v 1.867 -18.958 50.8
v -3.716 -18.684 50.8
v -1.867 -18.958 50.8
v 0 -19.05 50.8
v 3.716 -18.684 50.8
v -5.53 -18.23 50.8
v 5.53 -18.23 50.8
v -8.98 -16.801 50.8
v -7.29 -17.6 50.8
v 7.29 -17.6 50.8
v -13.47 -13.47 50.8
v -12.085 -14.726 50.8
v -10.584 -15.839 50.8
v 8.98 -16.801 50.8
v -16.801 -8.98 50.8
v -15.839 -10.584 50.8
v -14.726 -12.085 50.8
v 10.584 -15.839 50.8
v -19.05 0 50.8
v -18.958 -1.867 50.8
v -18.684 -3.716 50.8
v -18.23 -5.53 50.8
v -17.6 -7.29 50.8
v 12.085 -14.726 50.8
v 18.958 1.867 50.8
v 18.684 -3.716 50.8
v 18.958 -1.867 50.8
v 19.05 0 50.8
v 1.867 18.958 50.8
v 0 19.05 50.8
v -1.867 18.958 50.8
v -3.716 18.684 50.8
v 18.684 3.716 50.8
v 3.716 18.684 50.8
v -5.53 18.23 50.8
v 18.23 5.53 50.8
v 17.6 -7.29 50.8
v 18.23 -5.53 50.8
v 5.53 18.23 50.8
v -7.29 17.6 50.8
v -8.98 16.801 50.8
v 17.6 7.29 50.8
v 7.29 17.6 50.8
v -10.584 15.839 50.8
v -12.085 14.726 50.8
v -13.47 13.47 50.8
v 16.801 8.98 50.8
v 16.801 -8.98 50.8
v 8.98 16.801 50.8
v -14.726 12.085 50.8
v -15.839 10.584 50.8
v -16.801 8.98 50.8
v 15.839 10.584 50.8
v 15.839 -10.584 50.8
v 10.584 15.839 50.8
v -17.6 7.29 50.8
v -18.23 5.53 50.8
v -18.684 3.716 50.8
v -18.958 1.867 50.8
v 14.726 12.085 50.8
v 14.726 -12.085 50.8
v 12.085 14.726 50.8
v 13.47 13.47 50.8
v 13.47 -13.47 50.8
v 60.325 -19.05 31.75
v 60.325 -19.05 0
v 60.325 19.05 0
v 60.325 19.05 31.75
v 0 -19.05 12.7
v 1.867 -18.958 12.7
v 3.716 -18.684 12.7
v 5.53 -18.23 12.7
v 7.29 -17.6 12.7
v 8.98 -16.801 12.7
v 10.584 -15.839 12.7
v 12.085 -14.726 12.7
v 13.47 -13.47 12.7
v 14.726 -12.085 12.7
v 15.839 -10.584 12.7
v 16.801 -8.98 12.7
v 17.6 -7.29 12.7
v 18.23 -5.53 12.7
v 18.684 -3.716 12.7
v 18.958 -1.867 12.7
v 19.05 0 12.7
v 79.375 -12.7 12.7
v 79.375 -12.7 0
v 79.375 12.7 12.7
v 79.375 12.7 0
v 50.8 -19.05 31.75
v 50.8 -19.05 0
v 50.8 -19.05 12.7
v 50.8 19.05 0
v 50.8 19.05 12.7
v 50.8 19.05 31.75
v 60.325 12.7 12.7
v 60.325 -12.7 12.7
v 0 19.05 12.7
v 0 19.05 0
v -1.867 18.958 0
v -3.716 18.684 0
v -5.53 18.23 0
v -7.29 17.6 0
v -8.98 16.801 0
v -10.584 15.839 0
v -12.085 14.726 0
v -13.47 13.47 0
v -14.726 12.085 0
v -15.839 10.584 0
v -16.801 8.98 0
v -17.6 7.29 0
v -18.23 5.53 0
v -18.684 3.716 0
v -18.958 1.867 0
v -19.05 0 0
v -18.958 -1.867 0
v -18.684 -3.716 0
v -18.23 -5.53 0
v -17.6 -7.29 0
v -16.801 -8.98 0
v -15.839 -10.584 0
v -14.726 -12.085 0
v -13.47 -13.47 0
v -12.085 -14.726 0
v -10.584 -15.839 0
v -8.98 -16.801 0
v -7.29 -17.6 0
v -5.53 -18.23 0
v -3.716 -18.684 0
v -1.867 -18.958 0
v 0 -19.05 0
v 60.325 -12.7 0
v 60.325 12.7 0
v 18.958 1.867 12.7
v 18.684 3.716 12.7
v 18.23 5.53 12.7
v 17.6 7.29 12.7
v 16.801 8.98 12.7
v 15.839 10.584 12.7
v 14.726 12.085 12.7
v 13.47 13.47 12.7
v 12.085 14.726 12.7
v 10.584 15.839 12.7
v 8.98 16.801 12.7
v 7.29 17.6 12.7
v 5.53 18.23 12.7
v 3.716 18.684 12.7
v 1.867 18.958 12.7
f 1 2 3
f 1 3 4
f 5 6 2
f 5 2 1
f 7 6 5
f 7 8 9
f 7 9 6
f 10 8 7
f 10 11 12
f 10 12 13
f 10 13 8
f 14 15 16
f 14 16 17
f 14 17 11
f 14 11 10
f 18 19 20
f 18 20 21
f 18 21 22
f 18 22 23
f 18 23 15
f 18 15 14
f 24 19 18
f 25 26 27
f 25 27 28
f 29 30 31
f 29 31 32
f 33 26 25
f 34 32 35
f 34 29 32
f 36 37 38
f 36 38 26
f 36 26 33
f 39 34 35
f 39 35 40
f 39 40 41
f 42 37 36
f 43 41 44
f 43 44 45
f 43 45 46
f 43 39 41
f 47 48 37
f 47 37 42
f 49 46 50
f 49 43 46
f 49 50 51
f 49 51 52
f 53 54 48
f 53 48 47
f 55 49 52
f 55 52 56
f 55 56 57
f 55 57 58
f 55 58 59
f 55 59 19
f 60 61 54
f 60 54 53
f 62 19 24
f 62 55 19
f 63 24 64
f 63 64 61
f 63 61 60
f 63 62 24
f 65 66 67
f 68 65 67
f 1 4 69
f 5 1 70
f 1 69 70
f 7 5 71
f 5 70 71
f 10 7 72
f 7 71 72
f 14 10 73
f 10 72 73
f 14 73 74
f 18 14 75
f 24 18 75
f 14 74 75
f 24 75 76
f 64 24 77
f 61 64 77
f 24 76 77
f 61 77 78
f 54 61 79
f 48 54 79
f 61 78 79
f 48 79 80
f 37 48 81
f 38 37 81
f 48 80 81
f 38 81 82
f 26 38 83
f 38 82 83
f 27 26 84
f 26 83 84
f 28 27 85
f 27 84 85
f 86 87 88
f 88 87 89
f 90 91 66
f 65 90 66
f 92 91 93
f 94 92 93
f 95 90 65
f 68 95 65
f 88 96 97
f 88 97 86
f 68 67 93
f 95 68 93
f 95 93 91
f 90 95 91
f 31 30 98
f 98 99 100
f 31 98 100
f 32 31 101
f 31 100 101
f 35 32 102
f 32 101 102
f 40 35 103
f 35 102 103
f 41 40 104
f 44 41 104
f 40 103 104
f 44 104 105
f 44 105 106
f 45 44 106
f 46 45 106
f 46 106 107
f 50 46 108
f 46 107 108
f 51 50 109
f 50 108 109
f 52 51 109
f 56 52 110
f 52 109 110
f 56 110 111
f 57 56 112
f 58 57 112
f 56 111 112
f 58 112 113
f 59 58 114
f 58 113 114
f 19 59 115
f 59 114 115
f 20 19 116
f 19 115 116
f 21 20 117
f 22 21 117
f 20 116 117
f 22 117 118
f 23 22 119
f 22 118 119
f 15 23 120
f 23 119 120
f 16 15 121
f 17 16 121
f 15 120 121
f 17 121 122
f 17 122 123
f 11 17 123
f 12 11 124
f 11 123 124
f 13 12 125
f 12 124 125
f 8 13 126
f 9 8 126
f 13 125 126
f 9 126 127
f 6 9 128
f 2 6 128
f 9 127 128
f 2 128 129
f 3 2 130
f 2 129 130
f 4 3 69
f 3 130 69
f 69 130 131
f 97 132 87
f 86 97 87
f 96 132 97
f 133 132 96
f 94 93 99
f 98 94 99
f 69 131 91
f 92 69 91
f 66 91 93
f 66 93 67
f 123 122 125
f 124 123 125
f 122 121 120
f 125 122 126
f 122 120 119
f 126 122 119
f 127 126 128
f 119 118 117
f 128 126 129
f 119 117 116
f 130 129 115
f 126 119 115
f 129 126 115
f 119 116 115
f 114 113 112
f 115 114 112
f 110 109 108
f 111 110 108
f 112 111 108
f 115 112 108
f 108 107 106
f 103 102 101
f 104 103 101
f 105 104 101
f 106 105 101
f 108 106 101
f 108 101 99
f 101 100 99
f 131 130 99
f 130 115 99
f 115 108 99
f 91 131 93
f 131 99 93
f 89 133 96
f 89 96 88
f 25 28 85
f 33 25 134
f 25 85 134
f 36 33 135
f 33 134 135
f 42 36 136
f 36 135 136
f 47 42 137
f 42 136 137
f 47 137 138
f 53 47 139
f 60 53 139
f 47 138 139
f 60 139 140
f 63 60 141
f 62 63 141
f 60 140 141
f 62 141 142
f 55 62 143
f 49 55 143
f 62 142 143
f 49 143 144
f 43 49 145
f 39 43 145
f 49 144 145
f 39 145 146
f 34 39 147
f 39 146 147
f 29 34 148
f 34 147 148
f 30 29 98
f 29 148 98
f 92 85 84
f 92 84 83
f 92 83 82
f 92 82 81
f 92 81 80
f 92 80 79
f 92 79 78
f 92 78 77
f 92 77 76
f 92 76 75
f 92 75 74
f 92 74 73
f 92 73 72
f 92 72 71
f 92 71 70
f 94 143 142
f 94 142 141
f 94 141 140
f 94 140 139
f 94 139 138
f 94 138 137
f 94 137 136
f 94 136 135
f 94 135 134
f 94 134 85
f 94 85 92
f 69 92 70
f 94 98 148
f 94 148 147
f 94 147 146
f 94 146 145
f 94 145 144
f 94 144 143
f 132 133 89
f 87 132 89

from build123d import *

# Parameters (mm, degrees)
F1_DEPTH = 50.8
F0_W     = 19.05
F0_H     = 25.4
F2_DEPTH = 12.7
F3_DEPTH = 31.75


with BuildPart() as f1:
    # F0 (on Top) → F1 (new body)
    with BuildSketch(Plane.XY):
        with BuildLine():
            ThreePointArc((0, -19.05), (13.470384, -13.470384), (19.05, 0))
            ThreePointArc((19.05, 0), (13.470384, 13.470384), (0, 19.05))
            Line((0, 19.05), (0, -19.05))
        make_face()
        with BuildLine():
            Line((0, -19.05), (0, 19.05))
            ThreePointArc((0, 19.05), (-19.05, 0), (0, -19.05))
        make_face()
    extrude(amount=F1_DEPTH)

    # F0 (on Top) → F2 (join)
    with BuildSketch(Plane.XY):
        with BuildLine():
            ThreePointArc((0, 19.05), (13.470384, 13.470384), (19.05, 0))
            ThreePointArc((19.05, 0), (13.470384, -13.470384), (0, -19.05))
            Line((0, -19.05), (50.8, -19.05))
            Line((50.8, -19.05), (50.8, 19.05))
            Line((50.8, 19.05), (0, 19.05))
        make_face()
        with Locations((69.85, 0)):
            Rectangle(F0_W, F0_H)
    extrude(amount=F2_DEPTH)


with BuildPart() as f3:
    # F0 (on Top) → F3 (new body)
    with BuildSketch(Plane.XY):
        Polygon((60.325, 19.05), (50.8, 19.05), (50.8, -19.05), (60.325, -19.05), (60.325, -12.7), (60.325, 12.7), align=None)
    extrude(amount=F3_DEPTH)


solid = Compound([f1.part, f3.part])
